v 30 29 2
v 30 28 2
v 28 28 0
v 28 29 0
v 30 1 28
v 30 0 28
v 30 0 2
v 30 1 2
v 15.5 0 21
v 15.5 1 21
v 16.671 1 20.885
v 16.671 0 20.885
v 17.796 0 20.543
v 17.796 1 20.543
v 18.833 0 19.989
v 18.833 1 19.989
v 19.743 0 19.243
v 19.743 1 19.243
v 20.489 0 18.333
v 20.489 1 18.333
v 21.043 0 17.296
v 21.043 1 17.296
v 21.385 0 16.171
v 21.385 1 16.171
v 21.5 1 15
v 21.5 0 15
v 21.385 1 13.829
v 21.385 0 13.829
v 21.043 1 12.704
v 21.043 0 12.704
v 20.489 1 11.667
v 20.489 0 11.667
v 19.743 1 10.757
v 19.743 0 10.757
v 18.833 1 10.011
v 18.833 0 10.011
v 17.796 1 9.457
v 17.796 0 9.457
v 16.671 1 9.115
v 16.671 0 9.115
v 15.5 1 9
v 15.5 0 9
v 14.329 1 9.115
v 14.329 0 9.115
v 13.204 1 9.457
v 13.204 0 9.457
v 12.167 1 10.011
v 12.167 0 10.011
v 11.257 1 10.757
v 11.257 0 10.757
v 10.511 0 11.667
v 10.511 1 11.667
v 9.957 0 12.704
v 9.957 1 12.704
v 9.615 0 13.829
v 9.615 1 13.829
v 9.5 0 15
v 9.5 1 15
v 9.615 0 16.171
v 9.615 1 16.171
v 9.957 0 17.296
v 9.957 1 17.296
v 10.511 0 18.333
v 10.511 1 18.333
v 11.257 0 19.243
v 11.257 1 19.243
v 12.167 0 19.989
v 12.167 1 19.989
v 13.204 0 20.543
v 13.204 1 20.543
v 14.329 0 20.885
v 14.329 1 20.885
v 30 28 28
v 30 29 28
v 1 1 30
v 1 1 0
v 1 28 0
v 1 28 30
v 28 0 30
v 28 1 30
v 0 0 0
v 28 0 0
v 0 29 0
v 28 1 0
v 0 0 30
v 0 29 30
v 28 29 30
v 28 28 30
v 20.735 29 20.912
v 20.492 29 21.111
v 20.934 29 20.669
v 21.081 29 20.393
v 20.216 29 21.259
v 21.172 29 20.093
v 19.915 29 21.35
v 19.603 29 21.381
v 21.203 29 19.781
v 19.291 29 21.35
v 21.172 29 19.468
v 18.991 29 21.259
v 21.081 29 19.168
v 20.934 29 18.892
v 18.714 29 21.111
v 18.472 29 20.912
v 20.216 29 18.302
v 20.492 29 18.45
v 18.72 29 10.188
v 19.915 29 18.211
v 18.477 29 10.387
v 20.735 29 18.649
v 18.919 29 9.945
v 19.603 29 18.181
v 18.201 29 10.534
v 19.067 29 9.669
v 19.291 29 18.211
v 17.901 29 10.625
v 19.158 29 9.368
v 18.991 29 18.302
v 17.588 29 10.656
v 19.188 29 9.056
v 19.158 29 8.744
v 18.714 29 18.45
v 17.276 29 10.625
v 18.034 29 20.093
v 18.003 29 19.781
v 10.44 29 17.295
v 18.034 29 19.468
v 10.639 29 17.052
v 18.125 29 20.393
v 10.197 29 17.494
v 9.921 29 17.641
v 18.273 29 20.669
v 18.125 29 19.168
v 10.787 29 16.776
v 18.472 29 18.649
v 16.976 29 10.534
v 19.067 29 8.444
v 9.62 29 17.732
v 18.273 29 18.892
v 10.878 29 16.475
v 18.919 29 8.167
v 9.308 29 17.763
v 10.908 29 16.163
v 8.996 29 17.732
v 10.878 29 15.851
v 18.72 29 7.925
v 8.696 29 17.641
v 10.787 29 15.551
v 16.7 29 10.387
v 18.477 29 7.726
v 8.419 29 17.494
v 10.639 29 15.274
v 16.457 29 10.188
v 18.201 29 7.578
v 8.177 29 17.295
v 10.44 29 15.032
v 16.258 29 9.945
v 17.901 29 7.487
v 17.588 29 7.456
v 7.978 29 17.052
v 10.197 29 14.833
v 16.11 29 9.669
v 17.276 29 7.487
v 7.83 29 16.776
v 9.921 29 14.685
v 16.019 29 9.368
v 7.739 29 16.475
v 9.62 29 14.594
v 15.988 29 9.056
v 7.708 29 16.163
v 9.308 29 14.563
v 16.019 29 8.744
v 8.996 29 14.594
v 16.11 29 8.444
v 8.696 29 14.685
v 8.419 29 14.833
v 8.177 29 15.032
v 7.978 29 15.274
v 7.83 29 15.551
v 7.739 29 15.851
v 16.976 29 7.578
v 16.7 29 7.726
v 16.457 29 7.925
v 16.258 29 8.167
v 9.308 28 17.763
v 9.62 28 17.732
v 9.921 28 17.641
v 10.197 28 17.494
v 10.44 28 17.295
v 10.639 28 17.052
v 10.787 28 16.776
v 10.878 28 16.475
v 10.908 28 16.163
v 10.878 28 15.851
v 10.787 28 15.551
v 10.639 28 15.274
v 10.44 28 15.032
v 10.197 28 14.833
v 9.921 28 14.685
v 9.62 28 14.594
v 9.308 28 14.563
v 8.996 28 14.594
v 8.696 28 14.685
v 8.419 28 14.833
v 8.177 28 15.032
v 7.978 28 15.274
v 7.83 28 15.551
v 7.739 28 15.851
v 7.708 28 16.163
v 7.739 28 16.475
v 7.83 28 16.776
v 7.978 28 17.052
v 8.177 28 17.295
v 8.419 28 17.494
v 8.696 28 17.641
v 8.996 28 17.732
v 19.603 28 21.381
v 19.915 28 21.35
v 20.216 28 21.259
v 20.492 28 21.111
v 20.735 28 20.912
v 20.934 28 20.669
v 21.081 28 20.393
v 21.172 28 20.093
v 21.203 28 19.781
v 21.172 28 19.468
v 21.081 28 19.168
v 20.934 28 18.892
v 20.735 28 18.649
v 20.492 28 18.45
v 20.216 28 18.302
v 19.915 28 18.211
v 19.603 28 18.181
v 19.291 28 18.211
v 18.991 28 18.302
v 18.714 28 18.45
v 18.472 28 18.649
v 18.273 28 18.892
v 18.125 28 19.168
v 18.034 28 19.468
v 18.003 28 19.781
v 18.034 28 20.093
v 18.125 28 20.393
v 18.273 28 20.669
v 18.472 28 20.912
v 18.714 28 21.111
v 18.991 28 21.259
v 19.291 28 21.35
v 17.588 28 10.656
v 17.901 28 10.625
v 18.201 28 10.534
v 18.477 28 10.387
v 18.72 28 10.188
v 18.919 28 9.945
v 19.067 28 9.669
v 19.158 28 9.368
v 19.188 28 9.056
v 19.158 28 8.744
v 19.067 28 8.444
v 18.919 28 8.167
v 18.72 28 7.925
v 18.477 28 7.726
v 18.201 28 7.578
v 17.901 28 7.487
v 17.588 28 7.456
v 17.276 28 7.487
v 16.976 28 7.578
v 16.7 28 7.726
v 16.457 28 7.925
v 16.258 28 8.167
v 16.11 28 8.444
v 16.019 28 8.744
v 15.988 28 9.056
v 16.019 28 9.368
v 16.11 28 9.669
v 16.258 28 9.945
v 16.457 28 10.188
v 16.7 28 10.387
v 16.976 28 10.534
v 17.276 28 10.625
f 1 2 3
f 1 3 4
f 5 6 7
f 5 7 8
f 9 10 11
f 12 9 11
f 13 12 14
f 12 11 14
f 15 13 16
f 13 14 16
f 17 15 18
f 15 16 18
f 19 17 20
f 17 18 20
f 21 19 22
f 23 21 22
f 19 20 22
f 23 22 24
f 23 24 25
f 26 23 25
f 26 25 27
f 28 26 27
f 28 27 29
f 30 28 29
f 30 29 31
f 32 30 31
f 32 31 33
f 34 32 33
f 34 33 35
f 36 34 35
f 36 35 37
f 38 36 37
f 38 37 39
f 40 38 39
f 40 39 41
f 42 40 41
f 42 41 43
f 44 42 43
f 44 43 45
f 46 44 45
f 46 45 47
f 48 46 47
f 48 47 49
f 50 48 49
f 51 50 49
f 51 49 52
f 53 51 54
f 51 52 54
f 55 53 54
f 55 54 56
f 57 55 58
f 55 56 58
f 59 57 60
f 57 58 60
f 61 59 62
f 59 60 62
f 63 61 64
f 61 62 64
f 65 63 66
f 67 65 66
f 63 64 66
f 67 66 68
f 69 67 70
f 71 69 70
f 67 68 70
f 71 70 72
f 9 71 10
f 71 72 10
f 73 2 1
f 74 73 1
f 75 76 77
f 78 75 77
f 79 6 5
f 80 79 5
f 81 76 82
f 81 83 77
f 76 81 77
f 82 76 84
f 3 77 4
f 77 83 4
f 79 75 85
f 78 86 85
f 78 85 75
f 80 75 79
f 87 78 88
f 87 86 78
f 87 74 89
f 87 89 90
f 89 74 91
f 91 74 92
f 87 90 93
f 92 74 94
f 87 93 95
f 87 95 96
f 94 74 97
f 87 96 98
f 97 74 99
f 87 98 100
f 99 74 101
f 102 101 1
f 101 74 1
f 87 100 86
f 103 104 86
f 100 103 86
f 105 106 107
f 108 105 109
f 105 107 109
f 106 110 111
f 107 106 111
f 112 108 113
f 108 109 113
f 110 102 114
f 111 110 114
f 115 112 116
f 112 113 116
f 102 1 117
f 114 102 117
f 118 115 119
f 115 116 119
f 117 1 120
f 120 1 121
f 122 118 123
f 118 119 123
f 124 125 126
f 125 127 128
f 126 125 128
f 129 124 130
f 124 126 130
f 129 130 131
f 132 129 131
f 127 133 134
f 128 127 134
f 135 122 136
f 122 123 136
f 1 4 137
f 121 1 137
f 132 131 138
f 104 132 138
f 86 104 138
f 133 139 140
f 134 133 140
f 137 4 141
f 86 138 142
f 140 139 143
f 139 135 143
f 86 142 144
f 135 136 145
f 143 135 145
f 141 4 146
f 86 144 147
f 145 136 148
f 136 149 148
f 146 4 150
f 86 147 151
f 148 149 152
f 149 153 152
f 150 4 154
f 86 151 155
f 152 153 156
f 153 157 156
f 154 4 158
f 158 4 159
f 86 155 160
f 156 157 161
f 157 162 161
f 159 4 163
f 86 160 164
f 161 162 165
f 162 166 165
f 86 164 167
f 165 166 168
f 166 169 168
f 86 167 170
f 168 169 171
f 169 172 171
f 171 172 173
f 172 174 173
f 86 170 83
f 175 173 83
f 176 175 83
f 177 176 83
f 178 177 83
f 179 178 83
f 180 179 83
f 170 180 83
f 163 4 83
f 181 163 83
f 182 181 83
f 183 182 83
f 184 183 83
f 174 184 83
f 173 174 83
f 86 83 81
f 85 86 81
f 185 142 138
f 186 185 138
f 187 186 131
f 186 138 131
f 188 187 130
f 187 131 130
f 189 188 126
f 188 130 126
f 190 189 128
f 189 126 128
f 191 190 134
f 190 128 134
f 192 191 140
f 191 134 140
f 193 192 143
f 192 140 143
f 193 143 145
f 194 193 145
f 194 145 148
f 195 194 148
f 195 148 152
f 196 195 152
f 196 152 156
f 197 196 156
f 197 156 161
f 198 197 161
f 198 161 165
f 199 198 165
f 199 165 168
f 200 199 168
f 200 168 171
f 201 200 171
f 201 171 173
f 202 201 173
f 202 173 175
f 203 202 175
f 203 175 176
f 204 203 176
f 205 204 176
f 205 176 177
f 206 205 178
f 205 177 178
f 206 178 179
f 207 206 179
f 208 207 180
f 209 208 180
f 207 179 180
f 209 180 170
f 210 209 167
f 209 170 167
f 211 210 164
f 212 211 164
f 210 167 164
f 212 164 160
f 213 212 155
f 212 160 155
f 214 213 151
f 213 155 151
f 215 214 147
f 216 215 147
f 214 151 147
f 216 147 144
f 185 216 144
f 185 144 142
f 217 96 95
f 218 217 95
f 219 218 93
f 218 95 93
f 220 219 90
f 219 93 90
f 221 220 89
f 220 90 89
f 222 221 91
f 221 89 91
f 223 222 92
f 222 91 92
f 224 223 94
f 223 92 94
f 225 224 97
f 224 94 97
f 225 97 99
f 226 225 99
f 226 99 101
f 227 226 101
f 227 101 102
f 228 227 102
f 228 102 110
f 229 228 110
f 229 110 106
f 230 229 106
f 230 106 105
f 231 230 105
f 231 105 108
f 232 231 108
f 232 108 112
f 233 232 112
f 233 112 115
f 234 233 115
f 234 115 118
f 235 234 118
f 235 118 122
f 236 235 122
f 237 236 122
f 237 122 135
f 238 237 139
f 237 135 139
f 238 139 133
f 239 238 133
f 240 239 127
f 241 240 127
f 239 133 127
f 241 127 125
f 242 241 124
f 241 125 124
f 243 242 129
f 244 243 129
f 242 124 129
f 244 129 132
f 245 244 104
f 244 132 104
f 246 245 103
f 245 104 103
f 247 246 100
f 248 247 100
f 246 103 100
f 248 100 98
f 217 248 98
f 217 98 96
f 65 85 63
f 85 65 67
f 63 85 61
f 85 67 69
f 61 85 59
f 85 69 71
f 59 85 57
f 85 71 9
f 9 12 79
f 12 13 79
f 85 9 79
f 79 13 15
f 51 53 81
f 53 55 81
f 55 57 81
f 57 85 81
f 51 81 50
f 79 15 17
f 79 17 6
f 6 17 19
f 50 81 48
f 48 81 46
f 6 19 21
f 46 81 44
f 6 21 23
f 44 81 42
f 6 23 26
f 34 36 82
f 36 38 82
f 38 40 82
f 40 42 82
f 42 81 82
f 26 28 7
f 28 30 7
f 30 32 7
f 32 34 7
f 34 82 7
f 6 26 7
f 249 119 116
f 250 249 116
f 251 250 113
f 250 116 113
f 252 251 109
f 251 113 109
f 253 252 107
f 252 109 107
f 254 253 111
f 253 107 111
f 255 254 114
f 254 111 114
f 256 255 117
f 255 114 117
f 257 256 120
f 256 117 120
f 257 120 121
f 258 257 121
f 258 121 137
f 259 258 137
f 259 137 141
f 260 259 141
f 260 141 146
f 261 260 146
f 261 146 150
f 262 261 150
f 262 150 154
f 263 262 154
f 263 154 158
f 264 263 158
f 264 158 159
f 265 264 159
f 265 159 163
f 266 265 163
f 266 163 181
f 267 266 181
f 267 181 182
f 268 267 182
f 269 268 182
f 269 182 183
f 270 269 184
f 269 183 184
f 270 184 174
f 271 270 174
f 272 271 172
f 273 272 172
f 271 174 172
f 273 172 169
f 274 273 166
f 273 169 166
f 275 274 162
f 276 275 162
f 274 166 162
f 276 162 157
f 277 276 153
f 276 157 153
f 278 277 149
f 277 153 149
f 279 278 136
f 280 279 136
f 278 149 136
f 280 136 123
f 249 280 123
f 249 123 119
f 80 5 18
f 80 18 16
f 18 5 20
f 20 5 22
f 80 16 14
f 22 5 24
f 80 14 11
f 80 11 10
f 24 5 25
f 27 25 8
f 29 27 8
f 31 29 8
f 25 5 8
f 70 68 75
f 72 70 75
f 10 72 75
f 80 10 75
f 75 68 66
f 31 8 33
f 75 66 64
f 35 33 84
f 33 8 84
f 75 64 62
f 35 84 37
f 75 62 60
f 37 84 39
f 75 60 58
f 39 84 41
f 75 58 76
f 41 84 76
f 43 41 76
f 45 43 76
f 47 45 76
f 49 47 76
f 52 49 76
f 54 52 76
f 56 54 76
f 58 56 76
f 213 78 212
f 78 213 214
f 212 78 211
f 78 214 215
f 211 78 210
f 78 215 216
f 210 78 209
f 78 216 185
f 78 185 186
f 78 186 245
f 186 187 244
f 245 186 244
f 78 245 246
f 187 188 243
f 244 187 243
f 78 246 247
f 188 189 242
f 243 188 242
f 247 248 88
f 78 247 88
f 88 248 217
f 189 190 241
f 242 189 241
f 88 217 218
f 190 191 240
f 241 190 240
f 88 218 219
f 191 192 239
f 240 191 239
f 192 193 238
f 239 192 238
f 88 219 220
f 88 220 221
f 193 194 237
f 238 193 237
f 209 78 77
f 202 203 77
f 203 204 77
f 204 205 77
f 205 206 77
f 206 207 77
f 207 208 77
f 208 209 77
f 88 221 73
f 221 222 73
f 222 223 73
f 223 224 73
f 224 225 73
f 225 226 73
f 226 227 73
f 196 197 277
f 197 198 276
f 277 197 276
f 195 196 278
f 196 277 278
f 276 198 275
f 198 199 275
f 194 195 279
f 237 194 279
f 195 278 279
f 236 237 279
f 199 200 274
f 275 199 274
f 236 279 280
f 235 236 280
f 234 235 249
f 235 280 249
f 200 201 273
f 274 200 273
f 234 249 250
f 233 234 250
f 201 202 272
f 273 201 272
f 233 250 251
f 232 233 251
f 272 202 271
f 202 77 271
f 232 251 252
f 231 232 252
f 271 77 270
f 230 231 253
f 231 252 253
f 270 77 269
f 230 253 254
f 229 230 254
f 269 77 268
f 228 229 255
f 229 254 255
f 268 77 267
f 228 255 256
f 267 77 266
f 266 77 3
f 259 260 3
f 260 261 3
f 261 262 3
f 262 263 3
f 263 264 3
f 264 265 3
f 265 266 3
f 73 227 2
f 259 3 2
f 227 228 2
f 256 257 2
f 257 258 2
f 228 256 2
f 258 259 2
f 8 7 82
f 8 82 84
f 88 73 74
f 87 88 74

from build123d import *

# Parameters (mm, degrees)
BOSS_EXTRUDE1_DEPTH = 30
SKETCH3_R           = 1.6
CUT_EXTRUDE1_DEPTH  = 10
SKETCH2_R           = 6
CUT_EXTRUDE2_DEPTH  = 10
CHAMFER1_SIZE       = 2


with BuildPart() as part:
    # Sketch1 → Boss-Extrude1 (new body)
    with BuildSketch(Plane.XY):
        Polygon((0, 0), (30, 0), (30, 1), (1, 1), (1, 28), (30, 28), (30, 29), (0, 29), (0, 28), (0, 1), align=None)
    extrude(amount=BOSS_EXTRUDE1_DEPTH)

    # Sketch3 → Cut-Extrude1 (cut)
    with BuildSketch(Plane(origin=(0, 29, 0), x_dir=(1, 0, 0), z_dir=(0, 1, 0))):
        with Locations(Location((19.603232535, -19.78053164, 0), (0, 0, 270))):
            Circle(SKETCH3_R)
        with Locations(Location((9.308321888, -16.163237793, 0), (0, 0, 270))):
            Circle(SKETCH3_R)
        with Locations(Location((17.588445577, -9.056230567, 0), (0, 0, 270))):
            Circle(SKETCH3_R)
    extrude(amount=-CUT_EXTRUDE1_DEPTH, mode=Mode.SUBTRACT)

    # Sketch2 → Cut-Extrude2 (cut)
    with BuildSketch(Plane(origin=(0, 1, 0), x_dir=(1, 0, 0), z_dir=(0, 1, 0))):
        with Locations(Location((15.5, -15, 0), (0, 0, 270))):
            Circle(SKETCH2_R)
    extrude(amount=-CUT_EXTRUDE2_DEPTH, mode=Mode.SUBTRACT)

    # Chamfer1
    chamfer1_edges = [part.edges().sort_by_distance(p)[0] for p in [
        (30, 28.5, 0),
        (30, 0.5, 30),
        (30, 0.5, 0),
        (30, 28.5, 30),
    ]]
    chamfer(chamfer1_edges, length=CHAMFER1_SIZE)


solid = part.part
